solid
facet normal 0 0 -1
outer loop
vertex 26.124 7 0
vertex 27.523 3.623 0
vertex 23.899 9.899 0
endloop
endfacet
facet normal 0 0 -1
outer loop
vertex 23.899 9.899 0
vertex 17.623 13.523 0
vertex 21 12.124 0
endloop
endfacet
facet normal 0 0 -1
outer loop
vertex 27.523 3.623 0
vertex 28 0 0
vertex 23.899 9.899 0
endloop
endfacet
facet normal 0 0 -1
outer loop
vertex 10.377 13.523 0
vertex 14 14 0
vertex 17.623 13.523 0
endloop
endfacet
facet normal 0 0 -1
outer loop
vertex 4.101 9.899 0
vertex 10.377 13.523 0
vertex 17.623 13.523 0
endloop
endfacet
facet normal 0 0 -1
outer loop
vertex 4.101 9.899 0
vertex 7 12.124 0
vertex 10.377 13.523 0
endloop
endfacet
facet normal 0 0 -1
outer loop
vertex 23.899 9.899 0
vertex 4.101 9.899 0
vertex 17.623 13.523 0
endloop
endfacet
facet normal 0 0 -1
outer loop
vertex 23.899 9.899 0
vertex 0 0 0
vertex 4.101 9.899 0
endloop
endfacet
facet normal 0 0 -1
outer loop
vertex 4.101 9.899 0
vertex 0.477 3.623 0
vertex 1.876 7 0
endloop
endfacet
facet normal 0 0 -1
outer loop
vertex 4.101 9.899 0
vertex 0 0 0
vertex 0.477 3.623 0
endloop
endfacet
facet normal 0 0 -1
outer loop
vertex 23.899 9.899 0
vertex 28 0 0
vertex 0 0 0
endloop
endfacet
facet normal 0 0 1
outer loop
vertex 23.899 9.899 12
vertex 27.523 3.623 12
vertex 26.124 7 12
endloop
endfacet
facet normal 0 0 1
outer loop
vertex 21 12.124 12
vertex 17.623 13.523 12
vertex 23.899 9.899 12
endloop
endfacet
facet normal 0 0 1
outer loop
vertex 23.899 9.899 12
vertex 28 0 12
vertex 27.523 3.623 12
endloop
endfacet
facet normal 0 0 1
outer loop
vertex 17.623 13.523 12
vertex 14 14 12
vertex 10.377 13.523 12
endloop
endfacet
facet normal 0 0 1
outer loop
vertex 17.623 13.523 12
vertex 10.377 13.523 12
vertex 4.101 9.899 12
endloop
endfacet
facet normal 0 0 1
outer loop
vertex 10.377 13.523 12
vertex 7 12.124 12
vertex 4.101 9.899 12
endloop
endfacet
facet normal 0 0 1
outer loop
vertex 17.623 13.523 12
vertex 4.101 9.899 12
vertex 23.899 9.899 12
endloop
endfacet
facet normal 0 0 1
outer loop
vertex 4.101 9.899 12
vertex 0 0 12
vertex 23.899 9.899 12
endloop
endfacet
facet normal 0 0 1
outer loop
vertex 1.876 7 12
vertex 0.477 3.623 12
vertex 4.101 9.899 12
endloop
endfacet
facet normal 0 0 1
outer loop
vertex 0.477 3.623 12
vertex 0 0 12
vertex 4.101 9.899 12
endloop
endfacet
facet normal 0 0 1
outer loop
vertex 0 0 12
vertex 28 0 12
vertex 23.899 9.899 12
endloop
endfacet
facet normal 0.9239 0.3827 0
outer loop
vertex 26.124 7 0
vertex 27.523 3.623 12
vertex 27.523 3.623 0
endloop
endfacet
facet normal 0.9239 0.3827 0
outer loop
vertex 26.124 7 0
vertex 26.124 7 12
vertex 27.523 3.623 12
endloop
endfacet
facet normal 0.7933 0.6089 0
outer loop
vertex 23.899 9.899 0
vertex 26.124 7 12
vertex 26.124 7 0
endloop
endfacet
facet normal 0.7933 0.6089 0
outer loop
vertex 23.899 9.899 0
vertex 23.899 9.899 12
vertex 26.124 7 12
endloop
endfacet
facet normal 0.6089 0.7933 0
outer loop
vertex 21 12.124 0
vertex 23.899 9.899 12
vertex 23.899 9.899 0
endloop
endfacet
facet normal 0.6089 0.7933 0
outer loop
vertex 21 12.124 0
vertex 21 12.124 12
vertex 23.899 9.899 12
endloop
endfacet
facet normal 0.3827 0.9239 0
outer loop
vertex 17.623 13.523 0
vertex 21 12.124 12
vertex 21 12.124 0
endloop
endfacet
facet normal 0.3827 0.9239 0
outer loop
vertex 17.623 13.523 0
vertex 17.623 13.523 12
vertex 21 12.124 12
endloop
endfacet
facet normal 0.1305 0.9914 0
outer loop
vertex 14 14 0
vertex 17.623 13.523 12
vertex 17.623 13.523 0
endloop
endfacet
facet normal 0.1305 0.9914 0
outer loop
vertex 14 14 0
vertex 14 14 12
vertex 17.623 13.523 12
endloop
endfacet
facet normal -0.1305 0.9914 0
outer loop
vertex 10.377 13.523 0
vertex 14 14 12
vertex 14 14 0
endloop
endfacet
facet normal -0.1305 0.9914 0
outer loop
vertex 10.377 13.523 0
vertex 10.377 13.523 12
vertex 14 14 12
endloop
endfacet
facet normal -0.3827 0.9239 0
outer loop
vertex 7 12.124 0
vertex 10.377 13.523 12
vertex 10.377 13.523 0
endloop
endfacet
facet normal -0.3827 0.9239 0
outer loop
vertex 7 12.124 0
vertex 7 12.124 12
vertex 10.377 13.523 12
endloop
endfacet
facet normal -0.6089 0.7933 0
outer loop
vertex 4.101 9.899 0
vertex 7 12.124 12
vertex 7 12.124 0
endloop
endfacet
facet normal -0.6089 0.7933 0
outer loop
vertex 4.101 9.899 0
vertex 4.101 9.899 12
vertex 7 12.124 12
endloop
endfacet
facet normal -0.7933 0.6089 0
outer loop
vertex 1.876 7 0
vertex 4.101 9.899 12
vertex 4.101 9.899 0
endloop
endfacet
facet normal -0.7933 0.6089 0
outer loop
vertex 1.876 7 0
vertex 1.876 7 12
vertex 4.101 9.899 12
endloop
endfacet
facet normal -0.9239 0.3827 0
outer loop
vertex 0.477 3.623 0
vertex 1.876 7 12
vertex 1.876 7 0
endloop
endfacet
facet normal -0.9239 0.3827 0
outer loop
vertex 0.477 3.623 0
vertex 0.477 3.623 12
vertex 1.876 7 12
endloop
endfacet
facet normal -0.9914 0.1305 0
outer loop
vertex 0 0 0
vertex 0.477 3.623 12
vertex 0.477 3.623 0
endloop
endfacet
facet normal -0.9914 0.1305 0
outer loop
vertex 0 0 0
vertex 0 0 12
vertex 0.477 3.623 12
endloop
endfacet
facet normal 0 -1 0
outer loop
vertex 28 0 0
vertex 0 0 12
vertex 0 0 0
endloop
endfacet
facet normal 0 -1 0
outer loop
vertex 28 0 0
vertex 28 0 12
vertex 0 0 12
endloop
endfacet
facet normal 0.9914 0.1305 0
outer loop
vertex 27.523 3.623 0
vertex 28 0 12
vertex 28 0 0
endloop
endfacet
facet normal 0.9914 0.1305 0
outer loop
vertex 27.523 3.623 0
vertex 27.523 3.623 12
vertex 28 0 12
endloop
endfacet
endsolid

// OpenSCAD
$fn = 32;

// ----------------------------------------------------------------------
// Key bar: woodruff key, 12 mm thick
// ----------------------------------------------------------------------

// --- parameters (mm) ---
profile_height = 12;      // extrusion height
profile_points = 13;      // points of the closed outline

profile = [[28, 0], [27.523, 3.623], [26.124, 7], [23.899, 9.899], [21, 12.124], [17.623, 13.523], [14, 14], [10.377, 13.523], [7, 12.124], [4.101, 9.899], [1.876, 7], [0.477, 3.623], [0, 0]];  // single closed polygon, 13 points, counter clockwise

// --- the one profile operation ---
linear_extrude(height = profile_height) polygon(points = profile);
